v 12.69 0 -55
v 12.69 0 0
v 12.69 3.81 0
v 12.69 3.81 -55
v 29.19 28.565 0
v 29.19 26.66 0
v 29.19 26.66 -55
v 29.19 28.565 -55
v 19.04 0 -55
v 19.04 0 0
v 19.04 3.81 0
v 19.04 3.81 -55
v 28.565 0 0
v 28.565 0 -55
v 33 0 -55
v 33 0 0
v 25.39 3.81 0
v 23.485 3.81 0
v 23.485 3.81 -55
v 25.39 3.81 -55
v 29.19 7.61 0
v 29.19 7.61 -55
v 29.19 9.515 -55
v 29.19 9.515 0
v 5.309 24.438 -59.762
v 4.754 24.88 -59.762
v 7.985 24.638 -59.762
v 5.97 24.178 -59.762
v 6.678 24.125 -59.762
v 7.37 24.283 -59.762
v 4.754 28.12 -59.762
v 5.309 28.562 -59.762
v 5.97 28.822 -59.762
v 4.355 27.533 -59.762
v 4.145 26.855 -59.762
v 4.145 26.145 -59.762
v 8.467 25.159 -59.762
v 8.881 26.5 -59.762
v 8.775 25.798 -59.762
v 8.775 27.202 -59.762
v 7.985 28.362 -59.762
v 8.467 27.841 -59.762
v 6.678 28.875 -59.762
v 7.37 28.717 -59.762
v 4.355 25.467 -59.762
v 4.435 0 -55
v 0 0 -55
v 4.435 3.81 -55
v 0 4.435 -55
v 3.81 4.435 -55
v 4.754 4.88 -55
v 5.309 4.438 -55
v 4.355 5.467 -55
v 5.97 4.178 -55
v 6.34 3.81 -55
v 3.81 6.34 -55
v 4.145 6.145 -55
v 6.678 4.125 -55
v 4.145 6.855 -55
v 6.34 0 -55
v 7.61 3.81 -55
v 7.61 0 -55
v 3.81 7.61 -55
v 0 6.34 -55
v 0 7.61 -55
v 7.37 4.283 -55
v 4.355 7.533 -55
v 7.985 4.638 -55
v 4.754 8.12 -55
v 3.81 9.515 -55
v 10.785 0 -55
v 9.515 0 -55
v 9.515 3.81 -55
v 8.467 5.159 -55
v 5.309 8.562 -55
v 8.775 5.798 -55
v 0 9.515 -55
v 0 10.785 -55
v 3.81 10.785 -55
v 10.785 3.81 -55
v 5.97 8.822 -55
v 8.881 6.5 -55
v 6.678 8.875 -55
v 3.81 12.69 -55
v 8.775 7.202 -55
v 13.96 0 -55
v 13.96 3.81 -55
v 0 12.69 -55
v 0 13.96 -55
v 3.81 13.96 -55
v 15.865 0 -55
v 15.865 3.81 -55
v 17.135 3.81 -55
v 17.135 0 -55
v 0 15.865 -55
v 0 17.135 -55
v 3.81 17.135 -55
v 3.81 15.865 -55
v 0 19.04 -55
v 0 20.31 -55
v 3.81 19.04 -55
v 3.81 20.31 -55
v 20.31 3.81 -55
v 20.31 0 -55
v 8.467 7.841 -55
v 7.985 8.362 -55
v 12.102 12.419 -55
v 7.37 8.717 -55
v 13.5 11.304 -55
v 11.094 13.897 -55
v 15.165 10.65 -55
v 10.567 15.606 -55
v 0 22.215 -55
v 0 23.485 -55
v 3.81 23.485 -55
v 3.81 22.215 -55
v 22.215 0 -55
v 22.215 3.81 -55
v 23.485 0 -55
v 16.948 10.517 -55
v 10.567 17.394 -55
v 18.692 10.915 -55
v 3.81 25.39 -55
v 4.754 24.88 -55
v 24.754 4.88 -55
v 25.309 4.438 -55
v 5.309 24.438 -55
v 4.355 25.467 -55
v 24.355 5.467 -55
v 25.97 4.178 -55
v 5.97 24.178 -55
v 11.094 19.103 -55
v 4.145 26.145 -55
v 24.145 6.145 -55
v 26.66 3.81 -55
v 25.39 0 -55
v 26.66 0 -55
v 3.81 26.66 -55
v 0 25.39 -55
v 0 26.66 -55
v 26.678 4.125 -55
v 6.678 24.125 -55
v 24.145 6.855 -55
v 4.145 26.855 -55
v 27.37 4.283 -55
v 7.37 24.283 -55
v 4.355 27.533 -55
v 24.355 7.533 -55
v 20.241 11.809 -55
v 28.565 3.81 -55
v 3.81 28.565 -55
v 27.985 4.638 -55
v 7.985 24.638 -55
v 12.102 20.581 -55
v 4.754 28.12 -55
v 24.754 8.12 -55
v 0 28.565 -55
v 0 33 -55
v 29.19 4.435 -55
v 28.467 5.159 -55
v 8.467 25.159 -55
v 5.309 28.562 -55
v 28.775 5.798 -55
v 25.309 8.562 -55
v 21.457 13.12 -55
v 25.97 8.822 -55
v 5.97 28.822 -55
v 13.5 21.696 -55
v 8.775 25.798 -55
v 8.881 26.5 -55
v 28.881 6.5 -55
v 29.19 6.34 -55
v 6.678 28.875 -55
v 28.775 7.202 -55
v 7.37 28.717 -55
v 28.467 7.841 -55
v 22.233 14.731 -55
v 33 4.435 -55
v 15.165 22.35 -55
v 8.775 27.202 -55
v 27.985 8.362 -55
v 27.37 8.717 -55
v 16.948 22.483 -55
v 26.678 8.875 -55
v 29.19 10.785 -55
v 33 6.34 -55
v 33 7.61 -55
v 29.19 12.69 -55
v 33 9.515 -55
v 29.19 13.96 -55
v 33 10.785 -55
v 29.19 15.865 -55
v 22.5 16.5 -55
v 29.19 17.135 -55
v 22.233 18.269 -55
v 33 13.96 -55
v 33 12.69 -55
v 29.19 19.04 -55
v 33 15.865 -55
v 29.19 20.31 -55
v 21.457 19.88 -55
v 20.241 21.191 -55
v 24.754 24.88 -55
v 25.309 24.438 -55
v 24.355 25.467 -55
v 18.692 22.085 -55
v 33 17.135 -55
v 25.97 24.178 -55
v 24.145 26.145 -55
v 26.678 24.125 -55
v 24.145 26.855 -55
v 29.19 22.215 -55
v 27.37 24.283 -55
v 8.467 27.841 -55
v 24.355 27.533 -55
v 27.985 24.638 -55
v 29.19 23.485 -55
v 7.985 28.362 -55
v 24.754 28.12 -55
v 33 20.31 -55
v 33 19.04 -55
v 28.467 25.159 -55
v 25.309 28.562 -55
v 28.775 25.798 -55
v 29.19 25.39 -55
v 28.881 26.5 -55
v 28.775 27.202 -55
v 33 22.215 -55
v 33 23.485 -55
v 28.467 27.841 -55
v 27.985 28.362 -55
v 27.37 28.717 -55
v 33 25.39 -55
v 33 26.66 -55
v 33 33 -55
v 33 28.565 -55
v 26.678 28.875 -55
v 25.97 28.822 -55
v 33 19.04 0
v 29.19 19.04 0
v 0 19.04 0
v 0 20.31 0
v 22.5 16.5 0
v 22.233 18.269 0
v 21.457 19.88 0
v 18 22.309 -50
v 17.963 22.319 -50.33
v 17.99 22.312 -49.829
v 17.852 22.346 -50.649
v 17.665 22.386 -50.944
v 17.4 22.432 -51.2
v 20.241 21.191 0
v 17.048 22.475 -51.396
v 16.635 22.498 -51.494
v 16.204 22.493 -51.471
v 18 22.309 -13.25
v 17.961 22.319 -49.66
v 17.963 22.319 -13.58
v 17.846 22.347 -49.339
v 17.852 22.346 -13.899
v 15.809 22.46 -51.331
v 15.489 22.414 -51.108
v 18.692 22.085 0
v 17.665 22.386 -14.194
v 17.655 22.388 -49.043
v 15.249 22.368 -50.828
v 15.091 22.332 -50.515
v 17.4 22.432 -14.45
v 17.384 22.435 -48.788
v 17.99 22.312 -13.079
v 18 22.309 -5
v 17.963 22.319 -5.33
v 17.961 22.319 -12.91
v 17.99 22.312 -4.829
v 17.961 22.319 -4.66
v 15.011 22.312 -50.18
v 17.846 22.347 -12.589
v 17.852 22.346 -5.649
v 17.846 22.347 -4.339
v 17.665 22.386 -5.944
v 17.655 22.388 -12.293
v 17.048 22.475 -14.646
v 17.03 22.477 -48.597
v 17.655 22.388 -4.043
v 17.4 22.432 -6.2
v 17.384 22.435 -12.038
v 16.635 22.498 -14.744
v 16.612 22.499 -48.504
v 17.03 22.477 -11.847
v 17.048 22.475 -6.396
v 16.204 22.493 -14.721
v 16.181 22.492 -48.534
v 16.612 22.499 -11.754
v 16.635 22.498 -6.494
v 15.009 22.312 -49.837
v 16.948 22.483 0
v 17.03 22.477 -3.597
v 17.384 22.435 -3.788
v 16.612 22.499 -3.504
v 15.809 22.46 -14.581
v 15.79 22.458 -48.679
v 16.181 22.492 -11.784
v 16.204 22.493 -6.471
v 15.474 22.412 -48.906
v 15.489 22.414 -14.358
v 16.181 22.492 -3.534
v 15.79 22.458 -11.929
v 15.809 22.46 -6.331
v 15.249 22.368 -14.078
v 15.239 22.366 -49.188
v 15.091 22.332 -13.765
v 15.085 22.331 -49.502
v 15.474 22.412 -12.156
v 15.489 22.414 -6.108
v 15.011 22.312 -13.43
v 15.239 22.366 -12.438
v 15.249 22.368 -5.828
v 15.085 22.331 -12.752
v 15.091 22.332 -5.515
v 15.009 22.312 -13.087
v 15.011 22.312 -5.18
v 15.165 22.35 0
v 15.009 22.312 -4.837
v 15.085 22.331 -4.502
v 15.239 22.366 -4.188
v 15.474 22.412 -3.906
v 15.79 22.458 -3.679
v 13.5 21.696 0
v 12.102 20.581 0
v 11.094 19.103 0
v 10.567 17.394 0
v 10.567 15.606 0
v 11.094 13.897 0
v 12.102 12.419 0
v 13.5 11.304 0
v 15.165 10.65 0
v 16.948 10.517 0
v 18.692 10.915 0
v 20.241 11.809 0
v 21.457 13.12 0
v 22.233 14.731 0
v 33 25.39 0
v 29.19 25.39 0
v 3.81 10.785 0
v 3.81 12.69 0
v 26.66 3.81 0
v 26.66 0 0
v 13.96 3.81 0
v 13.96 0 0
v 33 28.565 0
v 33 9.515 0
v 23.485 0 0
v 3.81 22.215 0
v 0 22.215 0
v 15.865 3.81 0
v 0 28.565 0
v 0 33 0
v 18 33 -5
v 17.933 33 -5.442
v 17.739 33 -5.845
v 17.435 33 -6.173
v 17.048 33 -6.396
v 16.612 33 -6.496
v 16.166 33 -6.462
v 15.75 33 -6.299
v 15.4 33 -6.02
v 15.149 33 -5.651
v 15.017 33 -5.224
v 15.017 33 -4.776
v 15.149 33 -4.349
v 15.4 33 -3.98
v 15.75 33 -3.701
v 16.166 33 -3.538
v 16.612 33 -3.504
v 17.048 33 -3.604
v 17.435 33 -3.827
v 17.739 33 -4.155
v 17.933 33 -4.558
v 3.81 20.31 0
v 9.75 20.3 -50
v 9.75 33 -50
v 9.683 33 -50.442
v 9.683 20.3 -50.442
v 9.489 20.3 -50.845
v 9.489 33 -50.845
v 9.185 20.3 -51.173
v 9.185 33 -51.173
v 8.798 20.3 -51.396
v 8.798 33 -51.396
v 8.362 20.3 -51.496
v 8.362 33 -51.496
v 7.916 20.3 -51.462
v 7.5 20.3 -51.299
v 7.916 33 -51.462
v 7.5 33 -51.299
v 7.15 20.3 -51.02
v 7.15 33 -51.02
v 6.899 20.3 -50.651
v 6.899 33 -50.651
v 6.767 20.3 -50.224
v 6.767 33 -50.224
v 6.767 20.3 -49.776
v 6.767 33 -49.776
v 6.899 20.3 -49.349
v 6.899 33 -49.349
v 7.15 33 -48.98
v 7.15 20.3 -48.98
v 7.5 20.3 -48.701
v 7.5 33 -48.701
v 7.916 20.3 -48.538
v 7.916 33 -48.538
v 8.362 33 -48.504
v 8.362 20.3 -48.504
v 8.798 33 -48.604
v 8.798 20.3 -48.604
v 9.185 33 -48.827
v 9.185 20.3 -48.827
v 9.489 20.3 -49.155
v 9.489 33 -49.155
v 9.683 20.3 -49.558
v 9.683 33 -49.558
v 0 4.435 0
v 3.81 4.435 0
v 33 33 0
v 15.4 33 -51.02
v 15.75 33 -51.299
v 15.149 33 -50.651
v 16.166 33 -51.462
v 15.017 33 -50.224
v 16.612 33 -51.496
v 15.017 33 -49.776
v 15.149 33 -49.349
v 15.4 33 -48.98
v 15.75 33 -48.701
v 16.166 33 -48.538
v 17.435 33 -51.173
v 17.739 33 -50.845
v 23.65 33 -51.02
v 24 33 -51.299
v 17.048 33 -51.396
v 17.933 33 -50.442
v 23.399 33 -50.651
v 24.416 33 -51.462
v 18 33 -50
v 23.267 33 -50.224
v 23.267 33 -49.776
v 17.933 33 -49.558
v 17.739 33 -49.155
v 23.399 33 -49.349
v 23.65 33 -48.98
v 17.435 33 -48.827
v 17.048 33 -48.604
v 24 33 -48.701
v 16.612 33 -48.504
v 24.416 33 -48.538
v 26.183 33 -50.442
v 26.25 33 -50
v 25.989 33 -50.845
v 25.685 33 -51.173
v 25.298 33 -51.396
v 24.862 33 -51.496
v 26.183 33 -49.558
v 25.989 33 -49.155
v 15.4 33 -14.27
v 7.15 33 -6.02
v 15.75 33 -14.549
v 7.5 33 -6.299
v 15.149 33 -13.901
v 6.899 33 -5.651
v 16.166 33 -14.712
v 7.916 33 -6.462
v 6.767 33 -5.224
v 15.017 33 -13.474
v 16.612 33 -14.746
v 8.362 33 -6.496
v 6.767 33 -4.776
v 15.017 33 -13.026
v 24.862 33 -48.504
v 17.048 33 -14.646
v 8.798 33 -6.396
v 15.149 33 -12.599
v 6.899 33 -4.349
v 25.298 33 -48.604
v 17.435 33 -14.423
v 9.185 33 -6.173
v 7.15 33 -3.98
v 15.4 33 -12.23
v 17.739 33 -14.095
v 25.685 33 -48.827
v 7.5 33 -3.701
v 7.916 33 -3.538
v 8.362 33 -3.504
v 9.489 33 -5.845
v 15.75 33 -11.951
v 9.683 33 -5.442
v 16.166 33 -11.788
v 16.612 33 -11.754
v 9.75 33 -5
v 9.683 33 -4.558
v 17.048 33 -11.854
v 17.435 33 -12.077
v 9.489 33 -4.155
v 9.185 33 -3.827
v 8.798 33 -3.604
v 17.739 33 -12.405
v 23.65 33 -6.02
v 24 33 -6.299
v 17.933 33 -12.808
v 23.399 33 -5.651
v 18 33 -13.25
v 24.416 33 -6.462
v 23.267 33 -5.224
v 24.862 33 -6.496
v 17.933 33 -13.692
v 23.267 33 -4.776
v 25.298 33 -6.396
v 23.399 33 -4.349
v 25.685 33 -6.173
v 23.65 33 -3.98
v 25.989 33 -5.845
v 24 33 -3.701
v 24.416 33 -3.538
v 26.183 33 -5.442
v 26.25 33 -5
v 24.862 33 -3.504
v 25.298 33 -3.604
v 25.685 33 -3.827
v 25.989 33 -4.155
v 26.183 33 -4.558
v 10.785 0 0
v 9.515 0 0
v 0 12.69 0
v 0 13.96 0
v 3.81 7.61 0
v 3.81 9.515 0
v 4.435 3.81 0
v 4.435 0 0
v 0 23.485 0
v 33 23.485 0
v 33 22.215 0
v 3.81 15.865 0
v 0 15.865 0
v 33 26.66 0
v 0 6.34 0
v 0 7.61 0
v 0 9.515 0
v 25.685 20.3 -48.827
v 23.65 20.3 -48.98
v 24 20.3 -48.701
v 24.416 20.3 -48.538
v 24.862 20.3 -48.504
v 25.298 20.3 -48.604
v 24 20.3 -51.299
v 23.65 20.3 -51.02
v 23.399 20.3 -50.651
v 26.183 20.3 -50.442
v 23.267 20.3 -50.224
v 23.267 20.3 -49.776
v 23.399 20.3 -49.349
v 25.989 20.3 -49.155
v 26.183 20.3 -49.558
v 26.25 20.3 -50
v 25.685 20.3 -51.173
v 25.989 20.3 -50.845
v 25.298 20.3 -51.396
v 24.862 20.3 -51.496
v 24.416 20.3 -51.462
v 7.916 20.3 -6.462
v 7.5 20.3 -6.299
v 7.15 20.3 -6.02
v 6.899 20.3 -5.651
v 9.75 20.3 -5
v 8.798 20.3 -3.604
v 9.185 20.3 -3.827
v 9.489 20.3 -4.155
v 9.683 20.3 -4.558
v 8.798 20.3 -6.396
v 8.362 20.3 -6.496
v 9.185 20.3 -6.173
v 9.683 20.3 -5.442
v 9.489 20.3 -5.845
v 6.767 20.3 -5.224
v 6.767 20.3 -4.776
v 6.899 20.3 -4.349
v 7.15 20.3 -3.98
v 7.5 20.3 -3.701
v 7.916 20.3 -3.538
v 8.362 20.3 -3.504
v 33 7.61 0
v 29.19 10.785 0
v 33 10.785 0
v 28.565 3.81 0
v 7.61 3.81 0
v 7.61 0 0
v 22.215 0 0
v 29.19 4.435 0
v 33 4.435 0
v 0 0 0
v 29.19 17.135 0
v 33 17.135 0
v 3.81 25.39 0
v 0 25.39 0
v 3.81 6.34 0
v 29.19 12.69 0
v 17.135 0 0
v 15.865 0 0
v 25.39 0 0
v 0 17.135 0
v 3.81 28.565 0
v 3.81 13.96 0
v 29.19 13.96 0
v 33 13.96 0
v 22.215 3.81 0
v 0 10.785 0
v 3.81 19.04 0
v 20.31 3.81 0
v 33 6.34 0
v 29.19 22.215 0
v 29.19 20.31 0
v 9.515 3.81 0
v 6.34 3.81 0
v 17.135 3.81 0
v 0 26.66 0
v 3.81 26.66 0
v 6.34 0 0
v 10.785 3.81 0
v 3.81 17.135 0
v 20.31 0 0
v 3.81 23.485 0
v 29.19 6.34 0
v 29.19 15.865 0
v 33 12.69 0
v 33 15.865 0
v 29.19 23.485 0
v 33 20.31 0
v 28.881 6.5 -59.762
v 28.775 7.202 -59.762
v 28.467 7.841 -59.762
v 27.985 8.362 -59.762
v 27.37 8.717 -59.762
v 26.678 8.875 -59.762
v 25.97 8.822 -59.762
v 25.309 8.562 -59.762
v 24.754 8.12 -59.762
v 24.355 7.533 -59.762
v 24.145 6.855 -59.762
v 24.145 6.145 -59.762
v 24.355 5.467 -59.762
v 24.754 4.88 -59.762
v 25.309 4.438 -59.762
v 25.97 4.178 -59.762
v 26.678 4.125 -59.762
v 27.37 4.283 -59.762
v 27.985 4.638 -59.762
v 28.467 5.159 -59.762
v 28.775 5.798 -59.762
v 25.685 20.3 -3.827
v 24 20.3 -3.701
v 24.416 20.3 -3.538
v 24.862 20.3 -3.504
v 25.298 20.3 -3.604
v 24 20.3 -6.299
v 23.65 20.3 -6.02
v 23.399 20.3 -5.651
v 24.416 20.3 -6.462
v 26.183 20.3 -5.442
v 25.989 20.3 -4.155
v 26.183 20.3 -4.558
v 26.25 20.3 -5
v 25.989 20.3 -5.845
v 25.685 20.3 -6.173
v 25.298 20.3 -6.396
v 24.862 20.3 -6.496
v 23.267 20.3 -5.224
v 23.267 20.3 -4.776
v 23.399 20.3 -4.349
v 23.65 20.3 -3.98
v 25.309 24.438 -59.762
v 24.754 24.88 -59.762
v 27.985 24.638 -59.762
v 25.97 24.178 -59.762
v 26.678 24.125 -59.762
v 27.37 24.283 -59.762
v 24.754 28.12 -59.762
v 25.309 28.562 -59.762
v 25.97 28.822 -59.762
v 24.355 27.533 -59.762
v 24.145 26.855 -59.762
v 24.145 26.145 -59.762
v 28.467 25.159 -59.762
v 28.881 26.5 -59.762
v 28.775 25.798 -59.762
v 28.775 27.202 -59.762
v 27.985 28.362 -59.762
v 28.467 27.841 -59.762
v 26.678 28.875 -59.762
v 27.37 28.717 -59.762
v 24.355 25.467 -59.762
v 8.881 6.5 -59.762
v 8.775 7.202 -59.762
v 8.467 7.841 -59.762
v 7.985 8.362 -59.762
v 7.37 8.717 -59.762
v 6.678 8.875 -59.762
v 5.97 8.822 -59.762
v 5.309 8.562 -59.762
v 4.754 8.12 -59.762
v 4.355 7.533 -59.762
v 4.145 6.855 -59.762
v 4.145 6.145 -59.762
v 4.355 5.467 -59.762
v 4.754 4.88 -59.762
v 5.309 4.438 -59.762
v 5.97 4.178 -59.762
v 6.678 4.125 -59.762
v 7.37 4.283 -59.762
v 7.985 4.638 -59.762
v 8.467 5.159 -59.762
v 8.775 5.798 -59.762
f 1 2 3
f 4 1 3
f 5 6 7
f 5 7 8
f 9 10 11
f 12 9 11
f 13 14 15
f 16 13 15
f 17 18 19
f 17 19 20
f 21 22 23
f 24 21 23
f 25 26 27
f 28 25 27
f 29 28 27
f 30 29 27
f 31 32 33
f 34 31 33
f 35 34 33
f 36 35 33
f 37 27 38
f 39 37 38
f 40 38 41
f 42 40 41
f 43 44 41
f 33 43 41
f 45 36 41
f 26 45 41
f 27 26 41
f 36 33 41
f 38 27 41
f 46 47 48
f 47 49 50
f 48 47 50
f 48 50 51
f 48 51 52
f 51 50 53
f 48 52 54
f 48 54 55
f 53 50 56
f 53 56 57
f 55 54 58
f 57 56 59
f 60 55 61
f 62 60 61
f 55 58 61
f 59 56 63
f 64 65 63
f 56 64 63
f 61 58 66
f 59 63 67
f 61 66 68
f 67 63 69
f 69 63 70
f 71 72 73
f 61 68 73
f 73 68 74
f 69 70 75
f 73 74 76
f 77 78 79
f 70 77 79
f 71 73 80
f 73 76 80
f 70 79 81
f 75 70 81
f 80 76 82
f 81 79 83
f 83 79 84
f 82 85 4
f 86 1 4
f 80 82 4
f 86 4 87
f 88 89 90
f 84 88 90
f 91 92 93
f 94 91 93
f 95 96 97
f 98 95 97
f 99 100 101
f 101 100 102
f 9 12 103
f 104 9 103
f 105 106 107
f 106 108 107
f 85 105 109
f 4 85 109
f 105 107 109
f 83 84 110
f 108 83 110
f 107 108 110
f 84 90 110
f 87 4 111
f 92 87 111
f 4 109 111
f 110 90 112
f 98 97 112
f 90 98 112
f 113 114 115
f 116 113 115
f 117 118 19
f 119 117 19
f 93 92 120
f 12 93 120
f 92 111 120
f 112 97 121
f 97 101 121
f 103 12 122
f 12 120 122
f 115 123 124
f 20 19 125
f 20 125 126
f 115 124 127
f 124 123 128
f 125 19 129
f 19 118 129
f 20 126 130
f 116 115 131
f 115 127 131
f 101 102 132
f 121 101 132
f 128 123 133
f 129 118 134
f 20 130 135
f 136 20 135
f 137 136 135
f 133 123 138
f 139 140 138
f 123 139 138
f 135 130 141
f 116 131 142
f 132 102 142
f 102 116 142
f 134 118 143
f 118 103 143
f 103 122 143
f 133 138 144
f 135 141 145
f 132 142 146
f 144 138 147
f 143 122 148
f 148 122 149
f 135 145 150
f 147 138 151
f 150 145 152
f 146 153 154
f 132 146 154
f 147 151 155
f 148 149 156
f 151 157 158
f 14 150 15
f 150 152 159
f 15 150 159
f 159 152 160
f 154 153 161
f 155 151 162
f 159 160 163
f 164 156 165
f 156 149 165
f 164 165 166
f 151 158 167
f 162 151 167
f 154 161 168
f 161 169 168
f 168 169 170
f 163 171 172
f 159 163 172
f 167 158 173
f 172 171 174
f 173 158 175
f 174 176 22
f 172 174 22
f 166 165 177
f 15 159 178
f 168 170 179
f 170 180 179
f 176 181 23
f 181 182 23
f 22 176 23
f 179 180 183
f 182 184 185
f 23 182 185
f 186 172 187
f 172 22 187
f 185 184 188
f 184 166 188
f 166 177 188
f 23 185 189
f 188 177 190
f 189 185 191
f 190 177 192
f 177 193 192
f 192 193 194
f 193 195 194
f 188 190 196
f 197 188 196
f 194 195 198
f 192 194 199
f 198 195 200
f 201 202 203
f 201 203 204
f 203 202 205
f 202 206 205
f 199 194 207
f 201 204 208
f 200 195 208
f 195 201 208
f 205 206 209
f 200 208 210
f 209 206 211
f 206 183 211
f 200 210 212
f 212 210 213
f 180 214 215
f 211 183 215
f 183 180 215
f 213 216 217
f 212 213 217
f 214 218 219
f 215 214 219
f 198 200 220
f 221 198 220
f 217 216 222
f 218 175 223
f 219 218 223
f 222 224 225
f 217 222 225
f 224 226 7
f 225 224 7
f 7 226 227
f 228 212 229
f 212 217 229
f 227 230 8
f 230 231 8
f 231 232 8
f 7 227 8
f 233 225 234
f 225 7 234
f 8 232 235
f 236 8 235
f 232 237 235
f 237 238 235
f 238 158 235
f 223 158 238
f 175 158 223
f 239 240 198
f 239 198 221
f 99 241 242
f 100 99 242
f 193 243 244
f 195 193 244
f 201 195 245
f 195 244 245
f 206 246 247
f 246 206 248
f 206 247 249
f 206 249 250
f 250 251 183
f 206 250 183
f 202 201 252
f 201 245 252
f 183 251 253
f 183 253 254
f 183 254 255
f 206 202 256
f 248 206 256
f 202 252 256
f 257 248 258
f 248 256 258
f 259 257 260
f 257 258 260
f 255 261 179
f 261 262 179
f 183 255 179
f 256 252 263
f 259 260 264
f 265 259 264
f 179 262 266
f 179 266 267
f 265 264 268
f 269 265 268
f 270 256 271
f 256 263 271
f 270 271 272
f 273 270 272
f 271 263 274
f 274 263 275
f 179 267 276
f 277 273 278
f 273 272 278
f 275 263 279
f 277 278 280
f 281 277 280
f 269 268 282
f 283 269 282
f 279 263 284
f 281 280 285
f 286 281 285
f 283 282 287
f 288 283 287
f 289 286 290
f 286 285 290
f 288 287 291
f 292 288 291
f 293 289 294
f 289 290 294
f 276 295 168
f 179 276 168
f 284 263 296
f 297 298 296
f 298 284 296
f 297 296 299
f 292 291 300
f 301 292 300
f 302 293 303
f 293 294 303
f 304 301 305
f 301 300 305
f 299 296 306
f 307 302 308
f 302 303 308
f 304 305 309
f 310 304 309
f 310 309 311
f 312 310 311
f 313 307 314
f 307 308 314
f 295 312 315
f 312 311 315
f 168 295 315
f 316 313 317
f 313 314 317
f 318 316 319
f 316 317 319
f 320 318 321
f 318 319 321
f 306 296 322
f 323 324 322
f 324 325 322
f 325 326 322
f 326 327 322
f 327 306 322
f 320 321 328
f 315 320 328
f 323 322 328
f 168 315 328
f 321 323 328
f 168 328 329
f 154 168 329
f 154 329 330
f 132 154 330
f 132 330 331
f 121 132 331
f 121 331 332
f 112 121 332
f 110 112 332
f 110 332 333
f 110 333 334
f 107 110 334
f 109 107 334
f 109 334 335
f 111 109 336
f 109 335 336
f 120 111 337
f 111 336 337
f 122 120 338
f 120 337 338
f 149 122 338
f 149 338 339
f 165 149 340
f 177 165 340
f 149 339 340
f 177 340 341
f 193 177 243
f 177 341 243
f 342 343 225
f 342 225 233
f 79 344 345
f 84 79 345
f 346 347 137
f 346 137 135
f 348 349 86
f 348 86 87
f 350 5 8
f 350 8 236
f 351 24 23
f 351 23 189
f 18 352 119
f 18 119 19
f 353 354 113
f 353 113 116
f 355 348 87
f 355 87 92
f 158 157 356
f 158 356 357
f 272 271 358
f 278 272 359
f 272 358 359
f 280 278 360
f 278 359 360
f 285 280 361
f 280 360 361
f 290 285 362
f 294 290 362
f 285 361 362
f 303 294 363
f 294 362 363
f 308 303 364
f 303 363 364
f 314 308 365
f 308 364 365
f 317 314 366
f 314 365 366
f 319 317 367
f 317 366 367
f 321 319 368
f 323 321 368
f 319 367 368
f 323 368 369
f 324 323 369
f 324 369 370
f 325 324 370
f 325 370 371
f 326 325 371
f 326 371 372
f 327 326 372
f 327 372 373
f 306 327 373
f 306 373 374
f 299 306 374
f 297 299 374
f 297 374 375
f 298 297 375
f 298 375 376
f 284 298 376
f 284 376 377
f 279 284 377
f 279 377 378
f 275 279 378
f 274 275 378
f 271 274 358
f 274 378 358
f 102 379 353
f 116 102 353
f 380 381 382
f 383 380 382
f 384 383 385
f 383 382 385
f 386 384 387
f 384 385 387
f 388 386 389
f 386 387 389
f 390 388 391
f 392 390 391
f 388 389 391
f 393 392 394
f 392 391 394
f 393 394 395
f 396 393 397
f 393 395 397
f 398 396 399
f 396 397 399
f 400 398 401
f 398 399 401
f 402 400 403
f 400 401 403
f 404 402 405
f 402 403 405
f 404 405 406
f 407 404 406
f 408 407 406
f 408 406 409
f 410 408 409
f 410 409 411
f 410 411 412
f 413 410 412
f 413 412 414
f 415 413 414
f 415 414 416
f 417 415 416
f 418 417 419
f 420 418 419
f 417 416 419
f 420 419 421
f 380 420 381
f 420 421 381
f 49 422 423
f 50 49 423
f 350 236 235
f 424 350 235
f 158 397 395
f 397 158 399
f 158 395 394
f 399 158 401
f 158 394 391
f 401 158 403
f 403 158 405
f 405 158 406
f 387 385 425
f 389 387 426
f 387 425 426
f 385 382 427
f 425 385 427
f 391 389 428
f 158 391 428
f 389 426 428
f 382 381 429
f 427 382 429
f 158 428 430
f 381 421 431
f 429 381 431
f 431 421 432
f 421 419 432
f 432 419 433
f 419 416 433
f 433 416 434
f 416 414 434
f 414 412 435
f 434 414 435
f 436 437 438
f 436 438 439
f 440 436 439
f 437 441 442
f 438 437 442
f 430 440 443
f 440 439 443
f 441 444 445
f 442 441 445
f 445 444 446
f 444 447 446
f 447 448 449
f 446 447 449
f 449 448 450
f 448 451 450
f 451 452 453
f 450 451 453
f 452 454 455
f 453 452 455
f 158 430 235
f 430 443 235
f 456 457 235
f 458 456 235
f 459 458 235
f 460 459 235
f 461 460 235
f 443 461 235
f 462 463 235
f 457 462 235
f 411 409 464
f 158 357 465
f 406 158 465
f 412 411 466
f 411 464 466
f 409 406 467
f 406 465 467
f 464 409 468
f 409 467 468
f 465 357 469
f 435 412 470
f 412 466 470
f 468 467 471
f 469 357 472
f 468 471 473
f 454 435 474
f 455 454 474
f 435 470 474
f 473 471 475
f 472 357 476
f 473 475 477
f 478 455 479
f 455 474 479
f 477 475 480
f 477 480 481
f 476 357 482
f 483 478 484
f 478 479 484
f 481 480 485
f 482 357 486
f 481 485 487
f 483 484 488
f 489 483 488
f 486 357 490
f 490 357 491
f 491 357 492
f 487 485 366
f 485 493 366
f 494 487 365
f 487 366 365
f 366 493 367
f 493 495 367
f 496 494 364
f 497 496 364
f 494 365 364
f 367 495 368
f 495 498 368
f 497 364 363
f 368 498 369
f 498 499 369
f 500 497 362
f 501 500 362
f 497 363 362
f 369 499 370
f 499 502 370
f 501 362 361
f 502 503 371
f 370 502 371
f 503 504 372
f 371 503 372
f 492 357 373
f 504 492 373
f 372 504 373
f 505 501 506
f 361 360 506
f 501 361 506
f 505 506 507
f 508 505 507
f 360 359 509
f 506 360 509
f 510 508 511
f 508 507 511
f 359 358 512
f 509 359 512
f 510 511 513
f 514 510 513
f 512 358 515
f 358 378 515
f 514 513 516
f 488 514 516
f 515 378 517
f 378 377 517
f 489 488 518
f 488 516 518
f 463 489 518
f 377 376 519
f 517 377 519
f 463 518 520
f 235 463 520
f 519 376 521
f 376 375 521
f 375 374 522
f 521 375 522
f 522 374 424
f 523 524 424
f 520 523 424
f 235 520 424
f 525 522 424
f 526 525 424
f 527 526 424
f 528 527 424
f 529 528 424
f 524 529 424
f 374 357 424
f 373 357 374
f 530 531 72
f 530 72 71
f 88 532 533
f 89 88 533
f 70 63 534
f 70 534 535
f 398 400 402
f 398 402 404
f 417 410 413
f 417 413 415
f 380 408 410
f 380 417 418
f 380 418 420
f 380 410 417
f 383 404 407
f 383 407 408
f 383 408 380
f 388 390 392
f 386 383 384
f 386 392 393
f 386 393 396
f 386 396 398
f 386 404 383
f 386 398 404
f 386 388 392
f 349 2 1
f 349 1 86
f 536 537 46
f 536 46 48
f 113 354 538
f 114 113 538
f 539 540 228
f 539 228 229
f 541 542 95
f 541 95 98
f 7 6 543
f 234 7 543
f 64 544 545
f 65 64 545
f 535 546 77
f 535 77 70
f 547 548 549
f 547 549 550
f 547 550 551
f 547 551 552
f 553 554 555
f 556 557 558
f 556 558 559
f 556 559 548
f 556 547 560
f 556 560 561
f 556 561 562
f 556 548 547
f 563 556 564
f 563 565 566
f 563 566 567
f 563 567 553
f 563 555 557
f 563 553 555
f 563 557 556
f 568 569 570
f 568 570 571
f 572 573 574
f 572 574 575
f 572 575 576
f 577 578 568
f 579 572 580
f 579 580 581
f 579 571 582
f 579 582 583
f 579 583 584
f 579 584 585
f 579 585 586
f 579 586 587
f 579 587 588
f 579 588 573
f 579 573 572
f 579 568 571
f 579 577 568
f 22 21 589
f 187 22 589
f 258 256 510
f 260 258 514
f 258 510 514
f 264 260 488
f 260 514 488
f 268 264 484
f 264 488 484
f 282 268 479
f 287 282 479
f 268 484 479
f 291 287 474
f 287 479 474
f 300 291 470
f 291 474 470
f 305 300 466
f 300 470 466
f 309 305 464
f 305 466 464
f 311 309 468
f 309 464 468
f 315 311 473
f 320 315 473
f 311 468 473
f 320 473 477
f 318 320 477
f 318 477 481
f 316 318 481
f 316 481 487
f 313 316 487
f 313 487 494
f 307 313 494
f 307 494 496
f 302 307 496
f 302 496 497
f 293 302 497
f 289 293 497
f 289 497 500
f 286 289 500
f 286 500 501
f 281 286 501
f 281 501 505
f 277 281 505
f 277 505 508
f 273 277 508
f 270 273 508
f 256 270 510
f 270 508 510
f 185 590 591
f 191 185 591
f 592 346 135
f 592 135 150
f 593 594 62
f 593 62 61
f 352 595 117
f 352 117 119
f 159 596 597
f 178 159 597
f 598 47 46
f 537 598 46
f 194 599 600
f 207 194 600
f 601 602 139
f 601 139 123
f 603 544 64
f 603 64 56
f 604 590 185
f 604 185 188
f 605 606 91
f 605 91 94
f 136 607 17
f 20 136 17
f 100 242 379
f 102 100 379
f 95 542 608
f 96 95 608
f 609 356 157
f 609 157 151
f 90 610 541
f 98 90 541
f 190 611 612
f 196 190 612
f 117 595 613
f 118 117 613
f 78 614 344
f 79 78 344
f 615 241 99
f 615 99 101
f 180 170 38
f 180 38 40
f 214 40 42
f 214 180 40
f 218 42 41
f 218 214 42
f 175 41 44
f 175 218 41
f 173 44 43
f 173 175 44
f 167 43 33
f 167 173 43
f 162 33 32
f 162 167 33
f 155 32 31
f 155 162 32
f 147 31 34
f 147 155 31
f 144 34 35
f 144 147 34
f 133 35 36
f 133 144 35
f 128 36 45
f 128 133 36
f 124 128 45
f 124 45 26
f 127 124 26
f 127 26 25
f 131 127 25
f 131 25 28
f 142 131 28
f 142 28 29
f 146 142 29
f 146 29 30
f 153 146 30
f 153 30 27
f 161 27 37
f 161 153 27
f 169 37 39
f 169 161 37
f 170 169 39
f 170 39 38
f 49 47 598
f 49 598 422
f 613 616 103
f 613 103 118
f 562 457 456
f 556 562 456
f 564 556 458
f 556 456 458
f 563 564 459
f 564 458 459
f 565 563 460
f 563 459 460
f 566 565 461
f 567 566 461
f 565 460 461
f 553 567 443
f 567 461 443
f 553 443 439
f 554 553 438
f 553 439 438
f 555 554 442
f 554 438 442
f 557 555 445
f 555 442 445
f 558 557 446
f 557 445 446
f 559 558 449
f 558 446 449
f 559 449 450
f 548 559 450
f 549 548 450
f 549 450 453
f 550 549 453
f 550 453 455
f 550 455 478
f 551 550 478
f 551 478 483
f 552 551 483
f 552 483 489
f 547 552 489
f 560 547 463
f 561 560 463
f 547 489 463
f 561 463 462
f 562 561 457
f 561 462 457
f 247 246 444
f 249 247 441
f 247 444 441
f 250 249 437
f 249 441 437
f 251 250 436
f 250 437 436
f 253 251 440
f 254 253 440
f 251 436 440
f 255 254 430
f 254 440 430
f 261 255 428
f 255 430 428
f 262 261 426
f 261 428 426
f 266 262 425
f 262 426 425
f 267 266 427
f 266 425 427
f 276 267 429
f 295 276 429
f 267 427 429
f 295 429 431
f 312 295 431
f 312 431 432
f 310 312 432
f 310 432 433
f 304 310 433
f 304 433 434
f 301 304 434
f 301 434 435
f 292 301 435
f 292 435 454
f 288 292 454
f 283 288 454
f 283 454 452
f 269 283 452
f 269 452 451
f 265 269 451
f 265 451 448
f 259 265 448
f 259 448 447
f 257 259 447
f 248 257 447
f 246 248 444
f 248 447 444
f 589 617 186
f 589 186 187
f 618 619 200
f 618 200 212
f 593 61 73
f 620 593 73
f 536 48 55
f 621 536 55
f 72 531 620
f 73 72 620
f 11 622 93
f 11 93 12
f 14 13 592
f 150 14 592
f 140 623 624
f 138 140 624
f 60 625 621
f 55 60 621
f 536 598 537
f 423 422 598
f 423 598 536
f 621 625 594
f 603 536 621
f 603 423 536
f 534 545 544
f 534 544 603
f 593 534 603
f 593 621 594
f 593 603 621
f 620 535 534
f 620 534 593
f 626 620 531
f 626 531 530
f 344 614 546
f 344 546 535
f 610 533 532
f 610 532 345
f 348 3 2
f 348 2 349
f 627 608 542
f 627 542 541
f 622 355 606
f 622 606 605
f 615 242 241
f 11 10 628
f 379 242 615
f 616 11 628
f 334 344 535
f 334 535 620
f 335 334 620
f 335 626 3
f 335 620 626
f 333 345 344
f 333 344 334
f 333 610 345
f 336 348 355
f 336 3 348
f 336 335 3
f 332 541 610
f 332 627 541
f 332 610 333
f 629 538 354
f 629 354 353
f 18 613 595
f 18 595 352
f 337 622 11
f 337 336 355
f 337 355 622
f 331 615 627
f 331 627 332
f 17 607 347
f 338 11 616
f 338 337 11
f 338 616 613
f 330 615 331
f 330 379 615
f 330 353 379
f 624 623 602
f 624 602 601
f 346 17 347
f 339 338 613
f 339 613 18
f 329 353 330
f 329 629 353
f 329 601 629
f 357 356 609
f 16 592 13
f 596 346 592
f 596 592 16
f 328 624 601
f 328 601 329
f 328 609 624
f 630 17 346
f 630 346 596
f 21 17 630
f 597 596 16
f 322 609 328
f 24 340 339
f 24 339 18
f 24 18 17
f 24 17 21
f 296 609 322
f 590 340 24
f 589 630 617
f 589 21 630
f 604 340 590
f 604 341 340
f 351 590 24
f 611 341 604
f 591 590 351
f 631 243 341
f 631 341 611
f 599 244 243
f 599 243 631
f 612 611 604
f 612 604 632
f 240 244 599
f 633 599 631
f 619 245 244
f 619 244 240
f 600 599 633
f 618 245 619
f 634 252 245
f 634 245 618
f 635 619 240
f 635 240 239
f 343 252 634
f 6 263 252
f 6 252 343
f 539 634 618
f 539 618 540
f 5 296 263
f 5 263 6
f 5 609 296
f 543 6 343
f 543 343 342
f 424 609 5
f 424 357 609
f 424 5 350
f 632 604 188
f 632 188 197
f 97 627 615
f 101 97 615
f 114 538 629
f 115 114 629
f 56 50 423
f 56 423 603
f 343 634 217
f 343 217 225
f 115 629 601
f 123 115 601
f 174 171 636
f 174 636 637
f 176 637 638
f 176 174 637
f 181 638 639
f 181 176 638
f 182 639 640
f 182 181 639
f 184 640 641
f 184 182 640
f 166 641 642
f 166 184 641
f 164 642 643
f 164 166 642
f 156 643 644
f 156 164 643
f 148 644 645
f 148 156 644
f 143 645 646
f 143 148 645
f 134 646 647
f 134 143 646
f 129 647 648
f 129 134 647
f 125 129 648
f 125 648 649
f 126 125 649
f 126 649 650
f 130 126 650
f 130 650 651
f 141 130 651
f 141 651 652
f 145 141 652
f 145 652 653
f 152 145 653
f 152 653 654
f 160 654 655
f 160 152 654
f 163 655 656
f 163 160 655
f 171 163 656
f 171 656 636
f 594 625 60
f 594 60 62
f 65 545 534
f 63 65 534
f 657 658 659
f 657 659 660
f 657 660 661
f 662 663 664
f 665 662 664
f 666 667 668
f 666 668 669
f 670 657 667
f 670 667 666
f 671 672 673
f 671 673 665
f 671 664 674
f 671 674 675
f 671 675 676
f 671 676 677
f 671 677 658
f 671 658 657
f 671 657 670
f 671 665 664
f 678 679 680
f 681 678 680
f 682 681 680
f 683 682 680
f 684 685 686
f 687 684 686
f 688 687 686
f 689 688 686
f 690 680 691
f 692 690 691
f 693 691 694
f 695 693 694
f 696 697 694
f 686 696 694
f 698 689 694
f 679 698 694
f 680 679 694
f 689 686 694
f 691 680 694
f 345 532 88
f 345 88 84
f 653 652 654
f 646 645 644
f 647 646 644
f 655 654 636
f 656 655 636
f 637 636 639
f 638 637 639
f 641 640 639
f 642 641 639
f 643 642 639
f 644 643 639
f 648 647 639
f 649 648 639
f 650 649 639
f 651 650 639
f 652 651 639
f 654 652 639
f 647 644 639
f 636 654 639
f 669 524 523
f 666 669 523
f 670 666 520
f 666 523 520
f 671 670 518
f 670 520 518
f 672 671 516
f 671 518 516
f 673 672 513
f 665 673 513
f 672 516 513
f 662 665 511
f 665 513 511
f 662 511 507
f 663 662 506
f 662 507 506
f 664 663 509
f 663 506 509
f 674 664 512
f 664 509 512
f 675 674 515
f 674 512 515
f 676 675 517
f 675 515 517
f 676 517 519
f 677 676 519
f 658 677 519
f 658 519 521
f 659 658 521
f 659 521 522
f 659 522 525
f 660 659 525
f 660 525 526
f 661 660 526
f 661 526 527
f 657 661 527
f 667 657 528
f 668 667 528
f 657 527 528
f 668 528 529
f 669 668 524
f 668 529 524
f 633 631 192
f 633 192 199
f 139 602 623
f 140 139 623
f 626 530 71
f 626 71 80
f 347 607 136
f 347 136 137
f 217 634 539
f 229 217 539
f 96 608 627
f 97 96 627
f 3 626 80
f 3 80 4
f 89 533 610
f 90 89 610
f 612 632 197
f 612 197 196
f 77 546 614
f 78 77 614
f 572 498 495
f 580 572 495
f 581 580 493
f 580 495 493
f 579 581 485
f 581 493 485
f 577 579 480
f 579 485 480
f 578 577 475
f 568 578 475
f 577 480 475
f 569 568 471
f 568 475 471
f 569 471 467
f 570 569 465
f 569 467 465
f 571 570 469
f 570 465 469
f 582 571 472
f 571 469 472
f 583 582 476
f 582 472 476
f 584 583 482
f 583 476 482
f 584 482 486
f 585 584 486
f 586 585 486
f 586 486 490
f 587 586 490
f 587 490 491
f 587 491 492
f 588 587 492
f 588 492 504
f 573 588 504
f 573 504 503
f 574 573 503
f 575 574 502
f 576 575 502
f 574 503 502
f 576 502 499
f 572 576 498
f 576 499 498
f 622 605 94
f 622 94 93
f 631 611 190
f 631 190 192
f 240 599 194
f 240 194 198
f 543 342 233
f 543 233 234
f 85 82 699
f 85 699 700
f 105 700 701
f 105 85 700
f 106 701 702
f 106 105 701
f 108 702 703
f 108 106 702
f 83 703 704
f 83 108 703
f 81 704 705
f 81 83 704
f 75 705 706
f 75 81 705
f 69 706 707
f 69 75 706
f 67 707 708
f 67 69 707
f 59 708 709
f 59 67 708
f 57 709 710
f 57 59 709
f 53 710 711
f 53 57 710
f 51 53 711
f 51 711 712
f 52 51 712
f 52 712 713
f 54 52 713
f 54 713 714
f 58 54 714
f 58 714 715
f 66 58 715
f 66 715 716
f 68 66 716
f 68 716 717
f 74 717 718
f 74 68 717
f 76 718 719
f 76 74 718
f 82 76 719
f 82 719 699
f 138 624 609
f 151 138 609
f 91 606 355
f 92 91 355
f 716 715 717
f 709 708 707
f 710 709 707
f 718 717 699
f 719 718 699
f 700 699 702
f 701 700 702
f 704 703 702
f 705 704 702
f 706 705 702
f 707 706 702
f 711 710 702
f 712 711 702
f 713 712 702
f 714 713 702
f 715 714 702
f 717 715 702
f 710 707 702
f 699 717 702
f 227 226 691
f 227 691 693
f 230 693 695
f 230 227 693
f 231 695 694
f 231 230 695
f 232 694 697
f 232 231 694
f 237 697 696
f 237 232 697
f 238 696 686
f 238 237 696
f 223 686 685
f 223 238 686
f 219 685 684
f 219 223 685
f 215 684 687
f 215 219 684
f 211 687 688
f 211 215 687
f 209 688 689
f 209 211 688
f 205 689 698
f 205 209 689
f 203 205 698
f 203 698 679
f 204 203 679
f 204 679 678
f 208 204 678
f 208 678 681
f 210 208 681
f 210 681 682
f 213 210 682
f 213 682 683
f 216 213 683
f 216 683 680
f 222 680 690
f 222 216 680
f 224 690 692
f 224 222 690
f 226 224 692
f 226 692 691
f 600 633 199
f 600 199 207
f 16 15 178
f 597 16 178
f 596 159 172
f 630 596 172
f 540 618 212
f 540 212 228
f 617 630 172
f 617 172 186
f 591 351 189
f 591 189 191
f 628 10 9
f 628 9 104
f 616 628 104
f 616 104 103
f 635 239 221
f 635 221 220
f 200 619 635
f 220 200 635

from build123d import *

# Parameters (mm, degrees)
SKETCH1_W           = 33
SKETCH1_H           = 33
SKETCH1_R           = 6
BOSS_EXTRUDE1_DEPTH = 55
SKETCH2_R           = 1.5
CUT_EXTRUDE1_DEPTH  = 12.7
SKETCH5_W           = 3.81
SKETCH5_H           = 1.905
SKETCH5_W_2         = 1.905
SKETCH5_H_2         = 3.81
CUT_EXTRUDE2_DEPTH  = 56.0000001
SKETCH3_R           = 2.38125
BOSS_EXTRUDE2_DEPTH = 4.7625


with BuildPart() as part:
    # Sketch1 → Boss-Extrude1 (new body)
    with BuildSketch(Plane.XY):
        with Locations((16.5, 16.5)):
            Rectangle(SKETCH1_W, SKETCH1_H)
        with Locations((16.5, 16.5)):
            Circle(SKETCH1_R, mode=Mode.SUBTRACT)
    extrude(amount=-BOSS_EXTRUDE1_DEPTH)

    # Sketch2 → Cut-Extrude1 (cut)
    with BuildSketch(Plane(origin=(0, 33, 0), x_dir=(1, 0, 0), z_dir=(0, 1, 0))):
        with Locations((8.25, 5)):
            Circle(SKETCH2_R)
        with Locations((16.5, 5)):
            Circle(SKETCH2_R)
        with Locations((24.75, 5)):
            Circle(SKETCH2_R)
        with Locations((8.25, 50)):
            Circle(SKETCH2_R)
        with Locations((16.5, 50)):
            Circle(SKETCH2_R)
        with Locations((24.75, 50)):
            Circle(SKETCH2_R)
        with Locations((16.5, 13.25)):
            Circle(SKETCH2_R)
    extrude(amount=-CUT_EXTRUDE1_DEPTH, mode=Mode.SUBTRACT)

    # Sketch5 → Cut-Extrude2 (cut, through all)
    with BuildSketch(Plane.XY):
        with Locations((1.905, 27.6125)):
            Rectangle(SKETCH5_W, SKETCH5_H)
        with Locations((1.905, 24.4375)):
            Rectangle(SKETCH5_W, SKETCH5_H)
        with Locations((1.905, 21.2625)):
            Rectangle(SKETCH5_W, SKETCH5_H)
        with Locations((1.905, 18.0875)):
            Rectangle(SKETCH5_W, SKETCH5_H)
        with Locations((1.905, 14.9125)):
            Rectangle(SKETCH5_W, SKETCH5_H)
        with Locations((1.905, 11.7375)):
            Rectangle(SKETCH5_W, SKETCH5_H)
        with Locations((1.905, 8.5625)):
            Rectangle(SKETCH5_W, SKETCH5_H)
        with Locations((1.905, 5.3875)):
            Rectangle(SKETCH5_W, SKETCH5_H)
        with Locations((5.3875, 1.905)):
            Rectangle(SKETCH5_W_2, SKETCH5_H_2)
        with Locations((8.5625, 1.905)):
            Rectangle(SKETCH5_W_2, SKETCH5_H_2)
        with Locations((11.7375, 1.905)):
            Rectangle(SKETCH5_W_2, SKETCH5_H_2)
        with Locations((14.9125, 1.905)):
            Rectangle(SKETCH5_W_2, SKETCH5_H_2)
        with Locations((18.0875, 1.905)):
            Rectangle(SKETCH5_W_2, SKETCH5_H_2)
        with Locations((21.2625, 1.905)):
            Rectangle(SKETCH5_W_2, SKETCH5_H_2)
        with Locations((24.4375, 1.905)):
            Rectangle(SKETCH5_W_2, SKETCH5_H_2)
        with Locations((27.6125, 1.905)):
            Rectangle(SKETCH5_W_2, SKETCH5_H_2)
        with Locations((31.095, 5.3875)):
            Rectangle(SKETCH5_W, SKETCH5_H)
        with Locations((31.095, 8.5625)):
            Rectangle(SKETCH5_W, SKETCH5_H)
        with Locations((31.095, 11.7375)):
            Rectangle(SKETCH5_W, SKETCH5_H)
        with Locations((31.095, 14.9125)):
            Rectangle(SKETCH5_W, SKETCH5_H)
        with Locations((31.095, 18.0875)):
            Rectangle(SKETCH5_W, SKETCH5_H)
        with Locations((31.095, 21.2625)):
            Rectangle(SKETCH5_W, SKETCH5_H)
        with Locations((31.095, 24.4375)):
            Rectangle(SKETCH5_W, SKETCH5_H)
        with Locations((31.095, 27.6125)):
            Rectangle(SKETCH5_W, SKETCH5_H)
    extrude(amount=-CUT_EXTRUDE2_DEPTH, mode=Mode.SUBTRACT)

    # Sketch3 → Boss-Extrude2 (add)
    with BuildSketch(Plane.XY.offset(-55)):
        with Locations((6.5, 26.5)):
            Circle(SKETCH3_R)
        with Locations((26.5, 26.5)):
            Circle(SKETCH3_R)
        with Locations((26.5, 6.5)):
            Circle(SKETCH3_R)
        with Locations((6.5, 6.5)):
            Circle(SKETCH3_R)
    extrude(amount=-BOSS_EXTRUDE2_DEPTH)


solid = part.part
